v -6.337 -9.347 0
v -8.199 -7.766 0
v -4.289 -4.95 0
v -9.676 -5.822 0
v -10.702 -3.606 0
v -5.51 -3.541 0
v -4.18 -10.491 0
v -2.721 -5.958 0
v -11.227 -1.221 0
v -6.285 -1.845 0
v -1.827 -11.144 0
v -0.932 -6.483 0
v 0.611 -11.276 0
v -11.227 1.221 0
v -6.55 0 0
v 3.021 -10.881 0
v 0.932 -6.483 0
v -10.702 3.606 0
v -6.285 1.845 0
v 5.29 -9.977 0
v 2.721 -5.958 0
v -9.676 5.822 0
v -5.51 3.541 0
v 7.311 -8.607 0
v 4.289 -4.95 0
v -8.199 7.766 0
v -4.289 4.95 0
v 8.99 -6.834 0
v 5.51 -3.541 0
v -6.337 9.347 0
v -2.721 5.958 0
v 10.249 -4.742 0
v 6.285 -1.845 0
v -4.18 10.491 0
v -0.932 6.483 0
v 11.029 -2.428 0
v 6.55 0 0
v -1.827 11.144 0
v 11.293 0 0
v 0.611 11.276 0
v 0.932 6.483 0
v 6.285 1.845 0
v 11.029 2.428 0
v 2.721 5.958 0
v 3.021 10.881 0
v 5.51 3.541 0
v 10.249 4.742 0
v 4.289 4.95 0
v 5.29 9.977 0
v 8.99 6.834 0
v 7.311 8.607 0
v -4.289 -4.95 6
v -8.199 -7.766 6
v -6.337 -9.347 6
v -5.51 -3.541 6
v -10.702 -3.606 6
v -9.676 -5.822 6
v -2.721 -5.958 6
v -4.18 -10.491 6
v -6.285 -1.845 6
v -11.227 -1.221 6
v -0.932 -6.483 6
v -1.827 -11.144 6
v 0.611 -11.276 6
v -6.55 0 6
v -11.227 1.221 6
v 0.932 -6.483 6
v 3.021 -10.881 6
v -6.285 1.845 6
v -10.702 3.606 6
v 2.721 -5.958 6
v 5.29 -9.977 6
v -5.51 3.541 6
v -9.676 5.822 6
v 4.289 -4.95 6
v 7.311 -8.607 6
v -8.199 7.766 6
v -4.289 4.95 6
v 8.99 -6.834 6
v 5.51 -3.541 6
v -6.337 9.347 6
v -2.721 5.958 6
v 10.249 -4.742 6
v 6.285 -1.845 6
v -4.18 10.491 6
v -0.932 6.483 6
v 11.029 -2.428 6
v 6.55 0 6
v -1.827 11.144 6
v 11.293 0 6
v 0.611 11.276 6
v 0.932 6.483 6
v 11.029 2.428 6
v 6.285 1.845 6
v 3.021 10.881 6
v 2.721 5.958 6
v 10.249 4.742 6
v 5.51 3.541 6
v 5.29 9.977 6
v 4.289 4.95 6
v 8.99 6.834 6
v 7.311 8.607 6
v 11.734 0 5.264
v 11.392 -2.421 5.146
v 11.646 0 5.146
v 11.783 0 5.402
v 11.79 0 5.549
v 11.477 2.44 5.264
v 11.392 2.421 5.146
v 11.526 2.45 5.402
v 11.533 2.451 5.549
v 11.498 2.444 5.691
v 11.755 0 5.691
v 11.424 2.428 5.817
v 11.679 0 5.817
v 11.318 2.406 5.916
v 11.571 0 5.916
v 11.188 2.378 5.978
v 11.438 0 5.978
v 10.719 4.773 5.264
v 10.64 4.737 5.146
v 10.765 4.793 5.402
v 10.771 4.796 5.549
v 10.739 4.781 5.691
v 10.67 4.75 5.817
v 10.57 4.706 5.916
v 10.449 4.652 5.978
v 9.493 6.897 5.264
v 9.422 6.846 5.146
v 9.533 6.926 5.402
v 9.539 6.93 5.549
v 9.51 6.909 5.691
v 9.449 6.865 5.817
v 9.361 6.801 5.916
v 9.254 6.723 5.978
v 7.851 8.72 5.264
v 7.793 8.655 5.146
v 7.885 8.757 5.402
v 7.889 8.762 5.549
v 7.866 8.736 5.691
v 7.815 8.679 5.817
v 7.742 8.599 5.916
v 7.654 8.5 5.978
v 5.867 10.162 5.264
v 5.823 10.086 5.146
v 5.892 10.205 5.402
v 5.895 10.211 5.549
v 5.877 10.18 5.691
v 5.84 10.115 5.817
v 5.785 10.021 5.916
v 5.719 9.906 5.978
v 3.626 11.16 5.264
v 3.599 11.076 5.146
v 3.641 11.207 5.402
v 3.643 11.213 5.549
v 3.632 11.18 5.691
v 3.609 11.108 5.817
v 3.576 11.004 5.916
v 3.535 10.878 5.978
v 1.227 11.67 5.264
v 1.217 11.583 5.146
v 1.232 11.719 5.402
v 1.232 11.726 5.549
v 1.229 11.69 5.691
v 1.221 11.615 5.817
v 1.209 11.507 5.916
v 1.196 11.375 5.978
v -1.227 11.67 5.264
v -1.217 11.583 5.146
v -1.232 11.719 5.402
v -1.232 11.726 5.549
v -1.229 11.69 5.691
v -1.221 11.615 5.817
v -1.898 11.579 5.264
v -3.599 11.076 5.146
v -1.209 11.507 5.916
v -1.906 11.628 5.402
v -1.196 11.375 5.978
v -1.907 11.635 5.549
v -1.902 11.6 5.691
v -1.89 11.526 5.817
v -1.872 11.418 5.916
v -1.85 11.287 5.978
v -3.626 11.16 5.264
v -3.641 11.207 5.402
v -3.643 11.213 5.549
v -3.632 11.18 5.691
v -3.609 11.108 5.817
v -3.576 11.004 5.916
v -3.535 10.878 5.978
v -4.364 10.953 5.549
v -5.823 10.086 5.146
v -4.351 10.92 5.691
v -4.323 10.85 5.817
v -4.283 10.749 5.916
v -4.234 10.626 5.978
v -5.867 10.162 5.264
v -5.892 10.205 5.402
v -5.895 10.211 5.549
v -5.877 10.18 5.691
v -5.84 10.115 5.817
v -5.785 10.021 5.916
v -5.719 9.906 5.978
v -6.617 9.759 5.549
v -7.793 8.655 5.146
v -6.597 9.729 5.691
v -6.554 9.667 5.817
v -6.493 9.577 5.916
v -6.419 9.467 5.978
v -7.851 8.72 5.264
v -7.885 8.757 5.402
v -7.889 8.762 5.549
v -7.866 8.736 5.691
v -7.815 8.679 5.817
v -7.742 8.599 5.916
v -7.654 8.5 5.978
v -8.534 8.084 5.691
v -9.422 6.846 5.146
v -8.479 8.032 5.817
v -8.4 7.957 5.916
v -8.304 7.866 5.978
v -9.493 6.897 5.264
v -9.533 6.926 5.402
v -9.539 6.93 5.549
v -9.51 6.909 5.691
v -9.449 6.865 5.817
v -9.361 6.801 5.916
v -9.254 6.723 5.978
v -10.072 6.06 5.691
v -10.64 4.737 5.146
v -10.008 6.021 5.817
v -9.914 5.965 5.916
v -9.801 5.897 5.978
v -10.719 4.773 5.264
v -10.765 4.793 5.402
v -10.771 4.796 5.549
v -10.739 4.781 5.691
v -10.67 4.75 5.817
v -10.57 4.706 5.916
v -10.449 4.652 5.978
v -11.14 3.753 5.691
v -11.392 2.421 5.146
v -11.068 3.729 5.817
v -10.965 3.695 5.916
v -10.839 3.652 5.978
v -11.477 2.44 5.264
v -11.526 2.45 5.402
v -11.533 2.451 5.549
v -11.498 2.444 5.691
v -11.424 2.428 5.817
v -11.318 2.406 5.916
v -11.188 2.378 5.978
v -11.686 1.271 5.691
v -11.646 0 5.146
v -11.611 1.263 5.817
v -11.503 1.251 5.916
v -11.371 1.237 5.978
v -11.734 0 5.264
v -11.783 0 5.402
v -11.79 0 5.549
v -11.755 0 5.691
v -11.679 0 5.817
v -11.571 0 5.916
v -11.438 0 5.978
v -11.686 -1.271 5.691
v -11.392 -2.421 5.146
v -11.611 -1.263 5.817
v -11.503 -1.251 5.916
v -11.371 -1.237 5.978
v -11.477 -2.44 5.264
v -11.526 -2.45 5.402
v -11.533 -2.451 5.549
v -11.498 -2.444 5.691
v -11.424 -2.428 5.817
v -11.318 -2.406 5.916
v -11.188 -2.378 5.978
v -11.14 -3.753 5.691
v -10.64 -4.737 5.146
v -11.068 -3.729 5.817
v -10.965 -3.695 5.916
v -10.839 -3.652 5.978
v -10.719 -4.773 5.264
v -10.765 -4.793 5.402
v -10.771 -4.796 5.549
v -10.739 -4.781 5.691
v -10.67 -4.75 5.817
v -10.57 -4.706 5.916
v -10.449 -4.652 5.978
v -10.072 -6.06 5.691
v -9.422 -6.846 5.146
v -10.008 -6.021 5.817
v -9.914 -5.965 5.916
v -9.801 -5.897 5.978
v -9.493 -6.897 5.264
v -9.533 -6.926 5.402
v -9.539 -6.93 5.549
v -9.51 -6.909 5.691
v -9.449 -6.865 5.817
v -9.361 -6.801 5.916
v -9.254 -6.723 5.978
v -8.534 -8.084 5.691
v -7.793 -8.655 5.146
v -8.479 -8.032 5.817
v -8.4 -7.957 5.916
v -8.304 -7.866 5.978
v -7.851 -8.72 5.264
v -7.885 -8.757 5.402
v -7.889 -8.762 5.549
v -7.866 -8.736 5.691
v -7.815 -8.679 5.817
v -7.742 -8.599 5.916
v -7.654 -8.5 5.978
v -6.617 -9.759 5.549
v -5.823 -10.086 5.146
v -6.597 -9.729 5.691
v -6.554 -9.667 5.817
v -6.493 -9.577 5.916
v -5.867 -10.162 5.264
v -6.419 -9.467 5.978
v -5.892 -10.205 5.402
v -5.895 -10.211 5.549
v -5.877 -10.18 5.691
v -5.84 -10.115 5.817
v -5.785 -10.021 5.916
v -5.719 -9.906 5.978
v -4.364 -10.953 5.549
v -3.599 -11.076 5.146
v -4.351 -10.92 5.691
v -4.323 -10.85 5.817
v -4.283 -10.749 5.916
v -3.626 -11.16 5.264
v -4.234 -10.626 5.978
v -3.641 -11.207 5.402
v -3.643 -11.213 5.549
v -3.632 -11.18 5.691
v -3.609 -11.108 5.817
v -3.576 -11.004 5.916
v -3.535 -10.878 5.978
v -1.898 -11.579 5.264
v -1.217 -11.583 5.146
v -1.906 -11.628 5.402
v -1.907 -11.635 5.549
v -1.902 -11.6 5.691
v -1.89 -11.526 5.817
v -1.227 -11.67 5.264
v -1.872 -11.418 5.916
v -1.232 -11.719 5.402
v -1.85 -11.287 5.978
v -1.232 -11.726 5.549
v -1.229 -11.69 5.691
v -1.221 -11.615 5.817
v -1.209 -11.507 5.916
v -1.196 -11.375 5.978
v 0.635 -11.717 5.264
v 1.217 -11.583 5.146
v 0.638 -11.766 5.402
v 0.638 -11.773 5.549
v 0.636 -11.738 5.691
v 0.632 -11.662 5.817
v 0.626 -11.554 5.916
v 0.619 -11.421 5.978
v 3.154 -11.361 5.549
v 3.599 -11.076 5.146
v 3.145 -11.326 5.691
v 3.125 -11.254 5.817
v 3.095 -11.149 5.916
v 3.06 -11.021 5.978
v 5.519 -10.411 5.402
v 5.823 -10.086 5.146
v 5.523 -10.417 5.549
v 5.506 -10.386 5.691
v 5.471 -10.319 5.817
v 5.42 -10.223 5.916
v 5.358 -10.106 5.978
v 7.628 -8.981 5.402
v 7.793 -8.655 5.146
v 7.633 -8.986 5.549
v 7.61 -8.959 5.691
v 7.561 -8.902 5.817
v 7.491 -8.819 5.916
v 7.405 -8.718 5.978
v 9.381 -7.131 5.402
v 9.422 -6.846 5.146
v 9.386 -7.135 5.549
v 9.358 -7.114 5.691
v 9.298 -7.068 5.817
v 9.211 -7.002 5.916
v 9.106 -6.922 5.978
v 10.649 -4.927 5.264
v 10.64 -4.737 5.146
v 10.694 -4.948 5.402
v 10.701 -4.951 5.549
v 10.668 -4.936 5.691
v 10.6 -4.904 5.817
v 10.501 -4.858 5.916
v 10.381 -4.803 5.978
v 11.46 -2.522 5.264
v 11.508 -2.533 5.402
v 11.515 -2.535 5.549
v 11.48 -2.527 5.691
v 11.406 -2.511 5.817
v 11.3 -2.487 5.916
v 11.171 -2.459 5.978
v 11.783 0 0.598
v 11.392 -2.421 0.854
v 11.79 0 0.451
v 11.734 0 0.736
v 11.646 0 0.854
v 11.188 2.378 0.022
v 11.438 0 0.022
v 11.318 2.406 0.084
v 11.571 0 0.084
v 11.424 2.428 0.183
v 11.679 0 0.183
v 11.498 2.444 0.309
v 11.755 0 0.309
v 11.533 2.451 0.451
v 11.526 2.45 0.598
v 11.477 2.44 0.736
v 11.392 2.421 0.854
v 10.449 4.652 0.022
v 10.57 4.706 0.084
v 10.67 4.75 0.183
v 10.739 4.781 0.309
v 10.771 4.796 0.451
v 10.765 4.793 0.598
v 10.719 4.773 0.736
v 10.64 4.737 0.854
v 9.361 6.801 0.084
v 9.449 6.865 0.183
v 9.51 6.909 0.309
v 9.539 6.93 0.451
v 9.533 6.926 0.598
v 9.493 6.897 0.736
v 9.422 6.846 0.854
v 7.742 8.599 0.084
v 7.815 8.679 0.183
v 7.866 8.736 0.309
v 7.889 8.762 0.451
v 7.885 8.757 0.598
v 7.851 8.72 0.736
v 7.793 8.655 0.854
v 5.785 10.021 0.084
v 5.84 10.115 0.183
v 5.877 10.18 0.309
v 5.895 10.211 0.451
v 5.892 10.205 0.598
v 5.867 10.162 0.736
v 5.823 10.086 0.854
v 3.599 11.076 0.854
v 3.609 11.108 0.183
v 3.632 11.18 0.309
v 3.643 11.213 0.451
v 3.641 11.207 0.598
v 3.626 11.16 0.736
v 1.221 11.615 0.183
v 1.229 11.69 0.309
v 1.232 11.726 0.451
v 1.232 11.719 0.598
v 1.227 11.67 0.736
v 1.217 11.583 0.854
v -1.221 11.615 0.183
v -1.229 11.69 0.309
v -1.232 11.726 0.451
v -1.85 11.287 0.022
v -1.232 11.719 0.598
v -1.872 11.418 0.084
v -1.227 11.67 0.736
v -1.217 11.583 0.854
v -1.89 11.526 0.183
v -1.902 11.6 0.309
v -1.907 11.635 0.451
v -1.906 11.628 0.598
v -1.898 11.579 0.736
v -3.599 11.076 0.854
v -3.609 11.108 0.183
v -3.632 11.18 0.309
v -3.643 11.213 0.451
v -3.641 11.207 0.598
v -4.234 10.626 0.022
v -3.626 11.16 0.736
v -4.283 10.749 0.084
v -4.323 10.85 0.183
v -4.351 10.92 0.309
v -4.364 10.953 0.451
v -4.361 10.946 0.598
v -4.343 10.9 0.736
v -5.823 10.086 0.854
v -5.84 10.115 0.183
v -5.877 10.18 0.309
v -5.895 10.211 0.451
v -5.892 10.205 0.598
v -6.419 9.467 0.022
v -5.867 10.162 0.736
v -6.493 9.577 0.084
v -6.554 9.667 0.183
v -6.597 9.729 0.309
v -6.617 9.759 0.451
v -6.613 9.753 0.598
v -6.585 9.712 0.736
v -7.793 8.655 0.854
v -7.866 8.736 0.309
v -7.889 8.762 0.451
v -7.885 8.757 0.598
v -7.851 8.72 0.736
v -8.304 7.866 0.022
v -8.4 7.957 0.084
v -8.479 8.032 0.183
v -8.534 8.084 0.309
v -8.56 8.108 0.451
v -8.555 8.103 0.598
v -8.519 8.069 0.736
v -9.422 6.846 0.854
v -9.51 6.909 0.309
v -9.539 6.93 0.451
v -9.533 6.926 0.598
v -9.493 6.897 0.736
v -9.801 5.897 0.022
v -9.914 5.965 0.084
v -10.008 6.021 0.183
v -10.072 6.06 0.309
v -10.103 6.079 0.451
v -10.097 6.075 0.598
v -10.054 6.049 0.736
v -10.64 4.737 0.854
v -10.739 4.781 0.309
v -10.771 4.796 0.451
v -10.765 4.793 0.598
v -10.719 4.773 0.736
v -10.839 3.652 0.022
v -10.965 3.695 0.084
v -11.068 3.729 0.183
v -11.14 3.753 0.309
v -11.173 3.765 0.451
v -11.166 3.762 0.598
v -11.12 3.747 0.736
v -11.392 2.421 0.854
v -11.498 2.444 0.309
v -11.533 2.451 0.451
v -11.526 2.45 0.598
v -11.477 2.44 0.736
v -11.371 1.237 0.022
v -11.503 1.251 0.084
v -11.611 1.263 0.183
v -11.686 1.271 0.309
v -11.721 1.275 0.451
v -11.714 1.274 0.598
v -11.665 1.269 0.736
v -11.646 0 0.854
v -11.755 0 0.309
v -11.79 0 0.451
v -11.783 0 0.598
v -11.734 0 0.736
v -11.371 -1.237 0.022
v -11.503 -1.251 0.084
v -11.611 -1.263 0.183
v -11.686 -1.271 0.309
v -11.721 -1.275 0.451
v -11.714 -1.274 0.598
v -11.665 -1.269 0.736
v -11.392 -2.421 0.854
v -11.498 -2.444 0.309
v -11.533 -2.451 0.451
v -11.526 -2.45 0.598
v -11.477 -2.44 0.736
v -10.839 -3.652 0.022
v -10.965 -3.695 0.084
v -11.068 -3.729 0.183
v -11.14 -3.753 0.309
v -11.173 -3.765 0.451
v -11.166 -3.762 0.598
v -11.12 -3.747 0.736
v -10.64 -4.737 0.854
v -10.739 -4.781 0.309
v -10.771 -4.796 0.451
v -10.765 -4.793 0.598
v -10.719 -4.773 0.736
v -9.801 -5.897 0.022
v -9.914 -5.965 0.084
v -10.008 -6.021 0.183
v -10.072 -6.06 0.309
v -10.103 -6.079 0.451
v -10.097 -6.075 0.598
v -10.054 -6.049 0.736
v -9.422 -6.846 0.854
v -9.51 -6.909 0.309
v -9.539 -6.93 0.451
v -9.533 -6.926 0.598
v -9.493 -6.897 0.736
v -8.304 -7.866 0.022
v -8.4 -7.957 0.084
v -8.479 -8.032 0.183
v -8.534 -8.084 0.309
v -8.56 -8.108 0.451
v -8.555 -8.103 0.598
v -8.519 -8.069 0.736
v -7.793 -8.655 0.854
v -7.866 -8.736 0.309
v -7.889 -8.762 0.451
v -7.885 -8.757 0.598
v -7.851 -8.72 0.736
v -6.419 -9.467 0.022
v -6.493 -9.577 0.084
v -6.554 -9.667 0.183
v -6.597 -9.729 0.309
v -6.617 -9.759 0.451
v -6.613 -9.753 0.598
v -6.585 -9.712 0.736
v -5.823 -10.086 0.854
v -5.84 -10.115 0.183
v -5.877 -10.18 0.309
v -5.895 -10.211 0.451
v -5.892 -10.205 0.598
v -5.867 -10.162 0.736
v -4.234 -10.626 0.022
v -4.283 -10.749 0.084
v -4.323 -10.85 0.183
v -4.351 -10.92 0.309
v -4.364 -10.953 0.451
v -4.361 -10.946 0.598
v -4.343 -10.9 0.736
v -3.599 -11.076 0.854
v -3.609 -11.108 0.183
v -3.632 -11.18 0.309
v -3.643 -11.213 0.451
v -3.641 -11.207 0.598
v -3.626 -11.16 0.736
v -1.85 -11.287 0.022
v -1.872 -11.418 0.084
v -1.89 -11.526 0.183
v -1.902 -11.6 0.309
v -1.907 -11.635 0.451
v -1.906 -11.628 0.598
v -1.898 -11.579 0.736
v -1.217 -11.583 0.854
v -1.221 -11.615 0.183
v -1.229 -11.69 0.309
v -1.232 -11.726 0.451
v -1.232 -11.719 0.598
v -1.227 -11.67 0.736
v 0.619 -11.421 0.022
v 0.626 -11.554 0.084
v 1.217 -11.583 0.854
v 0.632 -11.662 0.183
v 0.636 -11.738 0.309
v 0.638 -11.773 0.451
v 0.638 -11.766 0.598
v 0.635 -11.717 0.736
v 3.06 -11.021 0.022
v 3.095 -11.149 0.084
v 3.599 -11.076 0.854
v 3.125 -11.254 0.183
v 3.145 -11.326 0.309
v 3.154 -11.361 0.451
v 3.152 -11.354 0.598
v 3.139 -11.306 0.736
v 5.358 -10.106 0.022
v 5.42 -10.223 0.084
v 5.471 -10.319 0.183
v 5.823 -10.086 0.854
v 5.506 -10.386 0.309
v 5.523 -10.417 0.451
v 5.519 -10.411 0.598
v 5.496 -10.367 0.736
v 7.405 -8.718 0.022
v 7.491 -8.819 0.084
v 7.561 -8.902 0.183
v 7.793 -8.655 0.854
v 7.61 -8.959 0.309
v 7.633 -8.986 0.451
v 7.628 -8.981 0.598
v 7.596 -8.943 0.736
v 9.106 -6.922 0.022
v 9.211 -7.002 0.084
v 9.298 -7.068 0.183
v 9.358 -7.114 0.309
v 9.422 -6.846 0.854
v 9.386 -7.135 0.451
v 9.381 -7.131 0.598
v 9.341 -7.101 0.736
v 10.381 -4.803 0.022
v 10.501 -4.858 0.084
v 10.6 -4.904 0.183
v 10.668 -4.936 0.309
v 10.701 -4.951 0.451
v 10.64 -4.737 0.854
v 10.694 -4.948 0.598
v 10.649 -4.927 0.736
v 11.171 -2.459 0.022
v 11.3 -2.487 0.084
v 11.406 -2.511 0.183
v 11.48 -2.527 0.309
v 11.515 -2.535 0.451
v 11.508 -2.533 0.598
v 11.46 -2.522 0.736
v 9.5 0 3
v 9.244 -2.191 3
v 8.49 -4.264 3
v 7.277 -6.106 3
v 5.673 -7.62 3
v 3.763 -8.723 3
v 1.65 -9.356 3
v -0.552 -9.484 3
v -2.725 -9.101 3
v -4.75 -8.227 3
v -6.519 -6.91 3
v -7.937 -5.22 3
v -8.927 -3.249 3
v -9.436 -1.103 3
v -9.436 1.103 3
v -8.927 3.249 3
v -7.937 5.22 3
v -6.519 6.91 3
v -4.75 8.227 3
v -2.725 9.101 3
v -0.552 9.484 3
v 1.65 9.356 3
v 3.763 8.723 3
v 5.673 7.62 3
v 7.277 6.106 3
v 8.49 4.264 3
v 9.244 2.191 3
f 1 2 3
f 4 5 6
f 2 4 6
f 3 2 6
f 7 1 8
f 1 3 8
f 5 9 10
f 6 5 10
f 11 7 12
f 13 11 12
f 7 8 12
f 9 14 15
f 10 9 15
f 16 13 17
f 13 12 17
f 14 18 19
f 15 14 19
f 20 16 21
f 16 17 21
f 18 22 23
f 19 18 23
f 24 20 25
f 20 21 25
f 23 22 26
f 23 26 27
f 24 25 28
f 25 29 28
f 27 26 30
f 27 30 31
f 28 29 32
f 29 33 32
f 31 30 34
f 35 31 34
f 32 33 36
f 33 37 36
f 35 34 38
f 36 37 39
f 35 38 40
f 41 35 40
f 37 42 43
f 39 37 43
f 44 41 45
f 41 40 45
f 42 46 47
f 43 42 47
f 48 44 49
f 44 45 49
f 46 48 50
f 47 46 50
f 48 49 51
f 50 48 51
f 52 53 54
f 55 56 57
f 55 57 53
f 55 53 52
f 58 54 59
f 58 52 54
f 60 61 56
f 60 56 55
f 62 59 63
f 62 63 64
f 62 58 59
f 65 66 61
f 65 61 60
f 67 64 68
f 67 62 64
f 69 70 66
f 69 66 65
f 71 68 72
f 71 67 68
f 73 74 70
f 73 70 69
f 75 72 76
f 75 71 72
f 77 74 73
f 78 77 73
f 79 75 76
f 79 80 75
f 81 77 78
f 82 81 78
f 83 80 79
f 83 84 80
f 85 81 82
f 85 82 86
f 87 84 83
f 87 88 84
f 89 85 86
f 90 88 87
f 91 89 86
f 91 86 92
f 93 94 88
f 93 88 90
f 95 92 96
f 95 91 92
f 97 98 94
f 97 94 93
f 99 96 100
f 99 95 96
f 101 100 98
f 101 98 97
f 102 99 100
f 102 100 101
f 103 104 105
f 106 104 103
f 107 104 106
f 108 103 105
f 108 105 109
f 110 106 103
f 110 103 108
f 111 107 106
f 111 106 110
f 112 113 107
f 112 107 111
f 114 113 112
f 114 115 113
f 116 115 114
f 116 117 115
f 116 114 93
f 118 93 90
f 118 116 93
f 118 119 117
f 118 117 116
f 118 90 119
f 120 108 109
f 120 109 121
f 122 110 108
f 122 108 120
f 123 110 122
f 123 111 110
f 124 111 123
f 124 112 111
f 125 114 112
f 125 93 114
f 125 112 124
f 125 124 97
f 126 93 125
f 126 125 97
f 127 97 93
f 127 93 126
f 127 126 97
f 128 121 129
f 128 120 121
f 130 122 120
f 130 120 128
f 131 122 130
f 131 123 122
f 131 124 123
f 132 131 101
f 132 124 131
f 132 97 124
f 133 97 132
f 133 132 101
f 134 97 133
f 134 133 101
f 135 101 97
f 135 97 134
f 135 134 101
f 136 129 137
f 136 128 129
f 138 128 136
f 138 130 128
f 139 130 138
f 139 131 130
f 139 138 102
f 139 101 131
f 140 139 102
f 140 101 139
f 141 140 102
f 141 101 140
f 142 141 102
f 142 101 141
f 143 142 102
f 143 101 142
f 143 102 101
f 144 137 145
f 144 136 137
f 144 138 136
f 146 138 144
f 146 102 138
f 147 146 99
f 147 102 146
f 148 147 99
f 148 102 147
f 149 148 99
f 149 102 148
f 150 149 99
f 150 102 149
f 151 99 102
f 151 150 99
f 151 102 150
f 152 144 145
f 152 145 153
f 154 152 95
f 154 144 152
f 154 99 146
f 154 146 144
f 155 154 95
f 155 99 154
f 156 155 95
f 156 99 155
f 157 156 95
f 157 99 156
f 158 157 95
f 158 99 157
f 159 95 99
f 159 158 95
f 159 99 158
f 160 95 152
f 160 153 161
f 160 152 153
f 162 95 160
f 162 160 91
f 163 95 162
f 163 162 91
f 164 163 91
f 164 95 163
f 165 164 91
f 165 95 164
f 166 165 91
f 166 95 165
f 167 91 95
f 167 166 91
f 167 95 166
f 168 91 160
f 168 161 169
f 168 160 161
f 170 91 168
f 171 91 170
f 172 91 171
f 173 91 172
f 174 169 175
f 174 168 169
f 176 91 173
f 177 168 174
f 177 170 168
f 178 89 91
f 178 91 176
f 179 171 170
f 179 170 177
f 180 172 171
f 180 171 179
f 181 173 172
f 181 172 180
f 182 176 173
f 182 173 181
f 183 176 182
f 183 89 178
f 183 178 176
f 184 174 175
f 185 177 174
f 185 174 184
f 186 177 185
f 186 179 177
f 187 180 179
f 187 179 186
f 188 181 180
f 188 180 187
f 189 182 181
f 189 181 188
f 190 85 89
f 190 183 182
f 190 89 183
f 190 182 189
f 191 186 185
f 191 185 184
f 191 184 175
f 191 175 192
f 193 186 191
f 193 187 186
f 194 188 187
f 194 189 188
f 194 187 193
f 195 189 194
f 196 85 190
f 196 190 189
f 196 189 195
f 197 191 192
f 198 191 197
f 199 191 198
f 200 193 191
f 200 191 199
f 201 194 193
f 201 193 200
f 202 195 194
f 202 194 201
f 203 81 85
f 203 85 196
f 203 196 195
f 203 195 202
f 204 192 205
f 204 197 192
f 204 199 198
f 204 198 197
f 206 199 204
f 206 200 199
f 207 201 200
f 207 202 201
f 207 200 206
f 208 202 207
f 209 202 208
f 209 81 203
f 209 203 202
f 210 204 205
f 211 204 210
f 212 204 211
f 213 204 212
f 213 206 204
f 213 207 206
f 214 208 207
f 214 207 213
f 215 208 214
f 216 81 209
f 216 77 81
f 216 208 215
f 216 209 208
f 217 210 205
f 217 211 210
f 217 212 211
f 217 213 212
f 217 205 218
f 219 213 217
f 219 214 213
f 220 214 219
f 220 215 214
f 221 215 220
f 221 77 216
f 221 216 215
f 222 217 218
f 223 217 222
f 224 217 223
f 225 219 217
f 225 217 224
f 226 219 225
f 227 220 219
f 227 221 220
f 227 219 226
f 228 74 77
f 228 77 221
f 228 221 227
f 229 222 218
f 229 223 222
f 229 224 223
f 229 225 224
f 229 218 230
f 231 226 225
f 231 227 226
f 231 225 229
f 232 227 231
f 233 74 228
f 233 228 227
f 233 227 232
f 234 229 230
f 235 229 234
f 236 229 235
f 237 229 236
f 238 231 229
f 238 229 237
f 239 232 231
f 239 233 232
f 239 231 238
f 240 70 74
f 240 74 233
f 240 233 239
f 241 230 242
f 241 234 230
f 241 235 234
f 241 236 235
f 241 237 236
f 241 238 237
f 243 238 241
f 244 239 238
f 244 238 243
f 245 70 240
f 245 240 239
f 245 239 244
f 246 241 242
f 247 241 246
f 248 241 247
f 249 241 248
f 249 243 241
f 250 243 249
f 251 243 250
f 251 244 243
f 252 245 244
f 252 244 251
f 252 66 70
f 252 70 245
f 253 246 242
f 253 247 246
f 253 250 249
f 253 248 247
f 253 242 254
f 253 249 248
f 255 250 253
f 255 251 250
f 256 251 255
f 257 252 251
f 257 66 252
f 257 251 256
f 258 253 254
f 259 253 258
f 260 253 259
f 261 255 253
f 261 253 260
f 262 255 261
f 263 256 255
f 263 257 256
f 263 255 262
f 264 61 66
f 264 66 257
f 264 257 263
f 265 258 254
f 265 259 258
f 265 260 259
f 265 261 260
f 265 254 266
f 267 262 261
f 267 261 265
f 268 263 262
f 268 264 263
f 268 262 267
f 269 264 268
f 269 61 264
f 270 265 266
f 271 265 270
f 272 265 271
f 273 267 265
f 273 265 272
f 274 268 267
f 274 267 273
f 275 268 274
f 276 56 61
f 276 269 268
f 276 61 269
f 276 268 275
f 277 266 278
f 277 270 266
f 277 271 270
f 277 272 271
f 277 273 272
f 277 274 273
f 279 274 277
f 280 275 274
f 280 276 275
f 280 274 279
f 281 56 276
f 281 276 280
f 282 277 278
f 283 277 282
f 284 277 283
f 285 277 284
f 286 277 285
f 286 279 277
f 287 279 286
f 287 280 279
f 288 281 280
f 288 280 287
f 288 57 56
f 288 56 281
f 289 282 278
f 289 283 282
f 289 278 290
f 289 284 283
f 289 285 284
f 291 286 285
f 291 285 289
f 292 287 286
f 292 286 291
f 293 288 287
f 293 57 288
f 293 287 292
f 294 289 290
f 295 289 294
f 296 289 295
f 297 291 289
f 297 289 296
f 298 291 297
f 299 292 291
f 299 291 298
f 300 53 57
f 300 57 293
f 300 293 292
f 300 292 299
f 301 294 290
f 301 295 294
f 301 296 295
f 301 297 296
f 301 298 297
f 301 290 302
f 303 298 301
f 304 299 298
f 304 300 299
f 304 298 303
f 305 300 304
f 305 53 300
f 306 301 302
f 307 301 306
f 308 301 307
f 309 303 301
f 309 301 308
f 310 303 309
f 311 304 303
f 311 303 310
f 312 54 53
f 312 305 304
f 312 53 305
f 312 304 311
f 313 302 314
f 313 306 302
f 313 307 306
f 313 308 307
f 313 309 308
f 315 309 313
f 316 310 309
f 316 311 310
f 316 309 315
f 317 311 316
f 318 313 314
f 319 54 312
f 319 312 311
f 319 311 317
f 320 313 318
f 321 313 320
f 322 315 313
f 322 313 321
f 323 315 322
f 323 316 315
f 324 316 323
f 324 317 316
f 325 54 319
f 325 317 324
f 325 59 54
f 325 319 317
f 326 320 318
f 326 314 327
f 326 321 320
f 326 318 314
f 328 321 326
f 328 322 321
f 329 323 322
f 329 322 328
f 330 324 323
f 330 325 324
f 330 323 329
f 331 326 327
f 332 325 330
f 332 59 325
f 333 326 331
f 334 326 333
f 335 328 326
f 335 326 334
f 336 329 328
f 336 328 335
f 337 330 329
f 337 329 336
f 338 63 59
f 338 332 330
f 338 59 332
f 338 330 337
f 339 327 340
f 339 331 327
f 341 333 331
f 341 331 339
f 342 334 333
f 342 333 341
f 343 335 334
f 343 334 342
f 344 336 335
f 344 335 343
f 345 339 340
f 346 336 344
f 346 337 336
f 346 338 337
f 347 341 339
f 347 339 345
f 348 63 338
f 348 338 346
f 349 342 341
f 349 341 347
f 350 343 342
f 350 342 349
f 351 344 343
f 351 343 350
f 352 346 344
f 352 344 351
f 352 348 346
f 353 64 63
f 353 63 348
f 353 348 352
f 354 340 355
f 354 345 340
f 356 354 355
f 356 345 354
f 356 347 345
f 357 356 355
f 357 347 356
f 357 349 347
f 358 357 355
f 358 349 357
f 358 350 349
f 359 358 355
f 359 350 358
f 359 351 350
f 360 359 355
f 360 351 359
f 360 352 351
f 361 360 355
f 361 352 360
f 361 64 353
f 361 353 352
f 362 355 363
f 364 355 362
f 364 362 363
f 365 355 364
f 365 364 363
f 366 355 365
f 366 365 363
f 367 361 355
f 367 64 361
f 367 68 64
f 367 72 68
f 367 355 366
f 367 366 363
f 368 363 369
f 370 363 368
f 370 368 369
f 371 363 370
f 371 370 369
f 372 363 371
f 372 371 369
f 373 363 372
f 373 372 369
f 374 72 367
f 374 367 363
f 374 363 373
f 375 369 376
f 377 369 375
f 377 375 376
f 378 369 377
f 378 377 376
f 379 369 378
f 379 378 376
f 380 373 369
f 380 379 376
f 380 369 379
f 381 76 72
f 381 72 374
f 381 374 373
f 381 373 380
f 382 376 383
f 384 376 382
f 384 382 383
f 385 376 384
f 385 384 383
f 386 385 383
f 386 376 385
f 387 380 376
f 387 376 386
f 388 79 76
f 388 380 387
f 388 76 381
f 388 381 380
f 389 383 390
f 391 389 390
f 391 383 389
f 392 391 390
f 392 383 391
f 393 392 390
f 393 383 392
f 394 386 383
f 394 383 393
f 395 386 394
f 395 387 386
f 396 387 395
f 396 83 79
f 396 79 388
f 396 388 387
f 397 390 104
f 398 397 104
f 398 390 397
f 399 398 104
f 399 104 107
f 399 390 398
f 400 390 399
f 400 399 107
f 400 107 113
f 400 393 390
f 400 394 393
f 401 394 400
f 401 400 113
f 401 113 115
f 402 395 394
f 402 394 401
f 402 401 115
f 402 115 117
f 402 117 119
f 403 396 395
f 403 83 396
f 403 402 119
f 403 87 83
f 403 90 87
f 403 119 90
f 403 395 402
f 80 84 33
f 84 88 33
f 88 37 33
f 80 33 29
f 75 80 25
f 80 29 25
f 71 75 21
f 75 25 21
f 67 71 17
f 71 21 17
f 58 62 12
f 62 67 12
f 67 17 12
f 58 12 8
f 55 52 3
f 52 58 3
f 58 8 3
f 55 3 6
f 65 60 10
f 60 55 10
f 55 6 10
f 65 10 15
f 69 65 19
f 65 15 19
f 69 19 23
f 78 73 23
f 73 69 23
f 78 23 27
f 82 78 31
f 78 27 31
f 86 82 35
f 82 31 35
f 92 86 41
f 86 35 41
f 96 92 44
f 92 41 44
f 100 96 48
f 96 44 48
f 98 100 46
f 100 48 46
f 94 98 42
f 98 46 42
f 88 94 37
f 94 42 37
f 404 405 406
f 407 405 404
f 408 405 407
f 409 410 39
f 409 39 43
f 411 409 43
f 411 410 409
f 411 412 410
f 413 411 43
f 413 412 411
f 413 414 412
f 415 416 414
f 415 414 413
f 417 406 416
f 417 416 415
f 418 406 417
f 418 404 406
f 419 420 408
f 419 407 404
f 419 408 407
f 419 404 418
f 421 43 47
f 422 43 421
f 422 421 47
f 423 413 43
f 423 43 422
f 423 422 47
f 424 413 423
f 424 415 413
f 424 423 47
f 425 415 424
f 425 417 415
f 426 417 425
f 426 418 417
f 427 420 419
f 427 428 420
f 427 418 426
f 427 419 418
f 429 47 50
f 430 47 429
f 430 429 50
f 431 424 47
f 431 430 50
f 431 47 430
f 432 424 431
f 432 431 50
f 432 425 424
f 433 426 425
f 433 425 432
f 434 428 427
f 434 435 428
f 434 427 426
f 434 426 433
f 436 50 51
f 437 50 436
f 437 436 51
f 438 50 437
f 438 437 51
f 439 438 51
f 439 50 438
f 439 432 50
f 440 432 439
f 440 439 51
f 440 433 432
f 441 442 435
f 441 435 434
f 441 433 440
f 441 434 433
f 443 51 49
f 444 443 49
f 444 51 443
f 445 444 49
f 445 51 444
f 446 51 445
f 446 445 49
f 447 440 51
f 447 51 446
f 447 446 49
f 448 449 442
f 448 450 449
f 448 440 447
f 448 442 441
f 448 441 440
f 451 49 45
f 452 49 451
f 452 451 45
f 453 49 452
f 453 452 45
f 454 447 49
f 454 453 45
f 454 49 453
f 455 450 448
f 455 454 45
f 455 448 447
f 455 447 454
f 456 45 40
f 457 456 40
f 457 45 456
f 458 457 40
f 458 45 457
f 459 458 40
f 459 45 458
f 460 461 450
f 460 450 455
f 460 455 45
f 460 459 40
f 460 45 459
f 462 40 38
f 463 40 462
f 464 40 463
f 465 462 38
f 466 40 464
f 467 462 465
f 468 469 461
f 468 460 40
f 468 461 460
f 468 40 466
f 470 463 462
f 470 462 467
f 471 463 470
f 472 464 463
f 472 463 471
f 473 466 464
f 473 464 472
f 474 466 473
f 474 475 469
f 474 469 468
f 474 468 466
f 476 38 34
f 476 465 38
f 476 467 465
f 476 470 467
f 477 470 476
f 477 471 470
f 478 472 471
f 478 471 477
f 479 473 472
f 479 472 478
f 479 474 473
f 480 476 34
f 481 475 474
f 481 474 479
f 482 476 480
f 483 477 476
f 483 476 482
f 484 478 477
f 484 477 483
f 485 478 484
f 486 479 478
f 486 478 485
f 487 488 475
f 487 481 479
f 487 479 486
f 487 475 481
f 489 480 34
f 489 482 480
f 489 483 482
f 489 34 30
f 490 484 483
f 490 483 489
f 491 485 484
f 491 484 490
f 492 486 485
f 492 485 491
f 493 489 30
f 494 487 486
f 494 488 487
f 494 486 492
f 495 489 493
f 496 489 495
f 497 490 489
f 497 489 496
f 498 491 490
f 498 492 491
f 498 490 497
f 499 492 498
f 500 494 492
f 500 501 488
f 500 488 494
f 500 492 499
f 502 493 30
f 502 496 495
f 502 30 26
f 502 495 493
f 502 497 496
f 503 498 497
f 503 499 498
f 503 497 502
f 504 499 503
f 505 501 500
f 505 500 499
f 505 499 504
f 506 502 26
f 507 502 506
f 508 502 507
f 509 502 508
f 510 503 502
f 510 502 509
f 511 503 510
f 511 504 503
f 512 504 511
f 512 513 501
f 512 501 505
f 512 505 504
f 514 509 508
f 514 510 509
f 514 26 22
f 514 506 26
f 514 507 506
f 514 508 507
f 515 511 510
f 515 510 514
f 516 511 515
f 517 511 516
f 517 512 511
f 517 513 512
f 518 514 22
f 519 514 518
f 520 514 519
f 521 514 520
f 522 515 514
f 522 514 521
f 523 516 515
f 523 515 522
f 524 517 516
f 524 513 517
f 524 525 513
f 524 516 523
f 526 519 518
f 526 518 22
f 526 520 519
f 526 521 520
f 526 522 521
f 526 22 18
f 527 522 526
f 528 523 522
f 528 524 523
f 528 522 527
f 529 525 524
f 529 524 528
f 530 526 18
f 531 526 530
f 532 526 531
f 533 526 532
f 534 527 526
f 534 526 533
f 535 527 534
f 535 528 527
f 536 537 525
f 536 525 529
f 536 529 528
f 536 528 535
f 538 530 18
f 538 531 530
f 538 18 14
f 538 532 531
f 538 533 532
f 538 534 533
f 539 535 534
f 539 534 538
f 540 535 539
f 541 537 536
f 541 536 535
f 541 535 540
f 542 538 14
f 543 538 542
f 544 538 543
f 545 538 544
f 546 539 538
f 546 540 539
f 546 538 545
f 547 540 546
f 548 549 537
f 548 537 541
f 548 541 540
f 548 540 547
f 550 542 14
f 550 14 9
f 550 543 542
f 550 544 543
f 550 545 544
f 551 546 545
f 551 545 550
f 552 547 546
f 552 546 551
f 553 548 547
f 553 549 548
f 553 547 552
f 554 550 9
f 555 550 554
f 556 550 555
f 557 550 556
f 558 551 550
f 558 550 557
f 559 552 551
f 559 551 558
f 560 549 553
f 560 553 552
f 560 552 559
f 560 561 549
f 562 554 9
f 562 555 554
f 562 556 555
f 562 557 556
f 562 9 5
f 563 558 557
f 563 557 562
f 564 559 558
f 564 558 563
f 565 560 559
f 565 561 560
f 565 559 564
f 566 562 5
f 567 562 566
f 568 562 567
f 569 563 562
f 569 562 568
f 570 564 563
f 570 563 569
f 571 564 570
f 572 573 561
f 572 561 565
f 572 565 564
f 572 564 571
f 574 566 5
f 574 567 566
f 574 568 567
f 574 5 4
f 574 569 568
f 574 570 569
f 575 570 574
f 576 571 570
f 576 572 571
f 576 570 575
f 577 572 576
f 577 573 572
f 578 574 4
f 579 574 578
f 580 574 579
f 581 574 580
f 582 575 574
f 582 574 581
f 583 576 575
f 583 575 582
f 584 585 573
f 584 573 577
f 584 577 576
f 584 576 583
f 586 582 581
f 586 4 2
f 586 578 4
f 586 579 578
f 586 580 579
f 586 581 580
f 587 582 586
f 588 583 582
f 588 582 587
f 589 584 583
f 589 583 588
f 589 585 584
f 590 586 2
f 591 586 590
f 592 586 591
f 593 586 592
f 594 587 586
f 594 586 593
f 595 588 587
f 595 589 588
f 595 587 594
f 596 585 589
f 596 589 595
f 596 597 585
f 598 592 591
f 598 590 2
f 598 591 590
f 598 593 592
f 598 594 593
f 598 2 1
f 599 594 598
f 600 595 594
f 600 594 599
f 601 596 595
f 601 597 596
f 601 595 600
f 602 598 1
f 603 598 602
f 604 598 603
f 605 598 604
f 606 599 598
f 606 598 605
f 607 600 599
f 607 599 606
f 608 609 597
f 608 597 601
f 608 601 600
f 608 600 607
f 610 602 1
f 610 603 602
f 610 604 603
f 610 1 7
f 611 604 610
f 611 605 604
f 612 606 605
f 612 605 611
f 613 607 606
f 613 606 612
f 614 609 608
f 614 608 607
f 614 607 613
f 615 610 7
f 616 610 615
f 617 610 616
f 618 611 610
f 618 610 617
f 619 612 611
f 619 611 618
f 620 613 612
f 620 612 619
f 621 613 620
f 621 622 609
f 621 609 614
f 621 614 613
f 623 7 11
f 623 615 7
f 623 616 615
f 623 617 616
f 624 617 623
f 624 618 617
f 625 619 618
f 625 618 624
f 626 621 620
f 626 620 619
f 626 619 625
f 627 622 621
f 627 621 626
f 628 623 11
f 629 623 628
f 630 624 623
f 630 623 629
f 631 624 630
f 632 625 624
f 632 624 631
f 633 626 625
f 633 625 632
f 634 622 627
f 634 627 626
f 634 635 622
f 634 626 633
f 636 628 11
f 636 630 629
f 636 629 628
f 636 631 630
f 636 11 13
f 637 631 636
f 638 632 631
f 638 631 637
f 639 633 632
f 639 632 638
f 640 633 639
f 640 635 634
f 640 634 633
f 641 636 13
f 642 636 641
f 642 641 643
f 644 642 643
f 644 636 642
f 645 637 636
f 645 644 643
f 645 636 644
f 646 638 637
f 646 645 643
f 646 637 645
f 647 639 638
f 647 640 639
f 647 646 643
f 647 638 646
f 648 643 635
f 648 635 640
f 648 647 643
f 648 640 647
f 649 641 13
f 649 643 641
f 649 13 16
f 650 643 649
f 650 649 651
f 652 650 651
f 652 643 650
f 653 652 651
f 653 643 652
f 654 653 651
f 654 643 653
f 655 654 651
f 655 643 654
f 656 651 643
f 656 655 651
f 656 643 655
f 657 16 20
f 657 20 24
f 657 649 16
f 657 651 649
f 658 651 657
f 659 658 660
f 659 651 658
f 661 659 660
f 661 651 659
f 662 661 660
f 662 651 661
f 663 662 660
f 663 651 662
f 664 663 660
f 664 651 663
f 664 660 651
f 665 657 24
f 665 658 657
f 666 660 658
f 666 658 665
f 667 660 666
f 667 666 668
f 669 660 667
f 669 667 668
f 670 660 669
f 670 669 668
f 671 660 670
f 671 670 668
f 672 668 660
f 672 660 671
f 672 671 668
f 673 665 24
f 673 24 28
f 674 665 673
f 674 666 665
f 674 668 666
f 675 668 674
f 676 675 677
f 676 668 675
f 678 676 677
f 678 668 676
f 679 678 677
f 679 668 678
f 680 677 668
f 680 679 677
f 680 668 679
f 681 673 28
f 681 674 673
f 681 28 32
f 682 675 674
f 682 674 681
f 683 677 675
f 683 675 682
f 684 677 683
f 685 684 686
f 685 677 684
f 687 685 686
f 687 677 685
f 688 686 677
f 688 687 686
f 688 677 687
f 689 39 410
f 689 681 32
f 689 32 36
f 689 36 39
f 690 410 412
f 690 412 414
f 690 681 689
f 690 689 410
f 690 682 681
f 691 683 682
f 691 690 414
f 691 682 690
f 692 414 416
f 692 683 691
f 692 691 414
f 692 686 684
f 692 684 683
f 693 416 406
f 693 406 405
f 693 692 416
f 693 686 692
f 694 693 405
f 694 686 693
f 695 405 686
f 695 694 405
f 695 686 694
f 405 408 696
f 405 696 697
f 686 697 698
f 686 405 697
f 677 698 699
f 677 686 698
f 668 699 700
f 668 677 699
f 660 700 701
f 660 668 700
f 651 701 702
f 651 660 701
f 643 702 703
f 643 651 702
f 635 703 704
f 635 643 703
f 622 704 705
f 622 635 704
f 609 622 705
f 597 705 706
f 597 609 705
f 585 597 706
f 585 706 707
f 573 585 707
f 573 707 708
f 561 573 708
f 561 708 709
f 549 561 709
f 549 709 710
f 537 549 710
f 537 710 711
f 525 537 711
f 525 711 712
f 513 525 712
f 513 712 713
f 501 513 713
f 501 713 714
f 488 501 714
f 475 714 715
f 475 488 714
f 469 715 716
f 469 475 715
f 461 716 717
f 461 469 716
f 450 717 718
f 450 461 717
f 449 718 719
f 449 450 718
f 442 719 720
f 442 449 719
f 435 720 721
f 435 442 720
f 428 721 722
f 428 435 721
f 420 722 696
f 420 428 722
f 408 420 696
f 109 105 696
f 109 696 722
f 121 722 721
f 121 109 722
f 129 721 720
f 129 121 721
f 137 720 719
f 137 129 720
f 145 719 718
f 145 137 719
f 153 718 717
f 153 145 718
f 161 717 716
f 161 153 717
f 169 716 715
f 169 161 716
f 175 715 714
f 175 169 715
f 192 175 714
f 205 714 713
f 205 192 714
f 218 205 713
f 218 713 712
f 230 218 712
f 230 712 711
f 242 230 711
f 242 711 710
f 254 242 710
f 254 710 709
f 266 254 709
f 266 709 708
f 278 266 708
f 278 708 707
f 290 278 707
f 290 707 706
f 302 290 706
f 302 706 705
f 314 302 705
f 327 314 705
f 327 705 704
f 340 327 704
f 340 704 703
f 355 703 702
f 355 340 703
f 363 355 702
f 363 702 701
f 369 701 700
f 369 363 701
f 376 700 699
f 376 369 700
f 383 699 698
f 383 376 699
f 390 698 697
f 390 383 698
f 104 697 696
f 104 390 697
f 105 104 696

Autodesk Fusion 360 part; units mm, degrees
sketch "Sketch1" plane through (0, 0, 0) normal (0, 0, 1) x (1, 0, 0)
  circle A0 centre (0, 0) radius 6.55
  circle A1 centre (0, 0) radius 12.5
  dimension "d1" = 13.1
  dimension "d2" = 25
extrude "Extrude1" add sketch "Sketch1" along normal blind 6
sketch "Sketch2" plane through (0, 0, 0) normal (0, 1, 0) x (1, 0, 0)
  line L0 (-12.5, -6) -> (12.5, -6)
  line L1 (-12.5, 0) -> (12.5, 0)
  line L2 (12.5, 0) -> (9.5, -3)
  line L3 (9.5, -3) -> (12.5, -6)
  line L4 (12.5, -6) -> (12.5, 0)
  dimension "d5" = 45
  dimension "d6" = 45
revolve "Revolve1" cut sketch "Sketch2" angle 360 about axis through (0, 0, 1.75) along (0, 0, 1)
fillet "Fillet1" radius 0.5 2 edges at (-11.6541, -4.5202, 0) (-11.6541, -4.5202, 6)
